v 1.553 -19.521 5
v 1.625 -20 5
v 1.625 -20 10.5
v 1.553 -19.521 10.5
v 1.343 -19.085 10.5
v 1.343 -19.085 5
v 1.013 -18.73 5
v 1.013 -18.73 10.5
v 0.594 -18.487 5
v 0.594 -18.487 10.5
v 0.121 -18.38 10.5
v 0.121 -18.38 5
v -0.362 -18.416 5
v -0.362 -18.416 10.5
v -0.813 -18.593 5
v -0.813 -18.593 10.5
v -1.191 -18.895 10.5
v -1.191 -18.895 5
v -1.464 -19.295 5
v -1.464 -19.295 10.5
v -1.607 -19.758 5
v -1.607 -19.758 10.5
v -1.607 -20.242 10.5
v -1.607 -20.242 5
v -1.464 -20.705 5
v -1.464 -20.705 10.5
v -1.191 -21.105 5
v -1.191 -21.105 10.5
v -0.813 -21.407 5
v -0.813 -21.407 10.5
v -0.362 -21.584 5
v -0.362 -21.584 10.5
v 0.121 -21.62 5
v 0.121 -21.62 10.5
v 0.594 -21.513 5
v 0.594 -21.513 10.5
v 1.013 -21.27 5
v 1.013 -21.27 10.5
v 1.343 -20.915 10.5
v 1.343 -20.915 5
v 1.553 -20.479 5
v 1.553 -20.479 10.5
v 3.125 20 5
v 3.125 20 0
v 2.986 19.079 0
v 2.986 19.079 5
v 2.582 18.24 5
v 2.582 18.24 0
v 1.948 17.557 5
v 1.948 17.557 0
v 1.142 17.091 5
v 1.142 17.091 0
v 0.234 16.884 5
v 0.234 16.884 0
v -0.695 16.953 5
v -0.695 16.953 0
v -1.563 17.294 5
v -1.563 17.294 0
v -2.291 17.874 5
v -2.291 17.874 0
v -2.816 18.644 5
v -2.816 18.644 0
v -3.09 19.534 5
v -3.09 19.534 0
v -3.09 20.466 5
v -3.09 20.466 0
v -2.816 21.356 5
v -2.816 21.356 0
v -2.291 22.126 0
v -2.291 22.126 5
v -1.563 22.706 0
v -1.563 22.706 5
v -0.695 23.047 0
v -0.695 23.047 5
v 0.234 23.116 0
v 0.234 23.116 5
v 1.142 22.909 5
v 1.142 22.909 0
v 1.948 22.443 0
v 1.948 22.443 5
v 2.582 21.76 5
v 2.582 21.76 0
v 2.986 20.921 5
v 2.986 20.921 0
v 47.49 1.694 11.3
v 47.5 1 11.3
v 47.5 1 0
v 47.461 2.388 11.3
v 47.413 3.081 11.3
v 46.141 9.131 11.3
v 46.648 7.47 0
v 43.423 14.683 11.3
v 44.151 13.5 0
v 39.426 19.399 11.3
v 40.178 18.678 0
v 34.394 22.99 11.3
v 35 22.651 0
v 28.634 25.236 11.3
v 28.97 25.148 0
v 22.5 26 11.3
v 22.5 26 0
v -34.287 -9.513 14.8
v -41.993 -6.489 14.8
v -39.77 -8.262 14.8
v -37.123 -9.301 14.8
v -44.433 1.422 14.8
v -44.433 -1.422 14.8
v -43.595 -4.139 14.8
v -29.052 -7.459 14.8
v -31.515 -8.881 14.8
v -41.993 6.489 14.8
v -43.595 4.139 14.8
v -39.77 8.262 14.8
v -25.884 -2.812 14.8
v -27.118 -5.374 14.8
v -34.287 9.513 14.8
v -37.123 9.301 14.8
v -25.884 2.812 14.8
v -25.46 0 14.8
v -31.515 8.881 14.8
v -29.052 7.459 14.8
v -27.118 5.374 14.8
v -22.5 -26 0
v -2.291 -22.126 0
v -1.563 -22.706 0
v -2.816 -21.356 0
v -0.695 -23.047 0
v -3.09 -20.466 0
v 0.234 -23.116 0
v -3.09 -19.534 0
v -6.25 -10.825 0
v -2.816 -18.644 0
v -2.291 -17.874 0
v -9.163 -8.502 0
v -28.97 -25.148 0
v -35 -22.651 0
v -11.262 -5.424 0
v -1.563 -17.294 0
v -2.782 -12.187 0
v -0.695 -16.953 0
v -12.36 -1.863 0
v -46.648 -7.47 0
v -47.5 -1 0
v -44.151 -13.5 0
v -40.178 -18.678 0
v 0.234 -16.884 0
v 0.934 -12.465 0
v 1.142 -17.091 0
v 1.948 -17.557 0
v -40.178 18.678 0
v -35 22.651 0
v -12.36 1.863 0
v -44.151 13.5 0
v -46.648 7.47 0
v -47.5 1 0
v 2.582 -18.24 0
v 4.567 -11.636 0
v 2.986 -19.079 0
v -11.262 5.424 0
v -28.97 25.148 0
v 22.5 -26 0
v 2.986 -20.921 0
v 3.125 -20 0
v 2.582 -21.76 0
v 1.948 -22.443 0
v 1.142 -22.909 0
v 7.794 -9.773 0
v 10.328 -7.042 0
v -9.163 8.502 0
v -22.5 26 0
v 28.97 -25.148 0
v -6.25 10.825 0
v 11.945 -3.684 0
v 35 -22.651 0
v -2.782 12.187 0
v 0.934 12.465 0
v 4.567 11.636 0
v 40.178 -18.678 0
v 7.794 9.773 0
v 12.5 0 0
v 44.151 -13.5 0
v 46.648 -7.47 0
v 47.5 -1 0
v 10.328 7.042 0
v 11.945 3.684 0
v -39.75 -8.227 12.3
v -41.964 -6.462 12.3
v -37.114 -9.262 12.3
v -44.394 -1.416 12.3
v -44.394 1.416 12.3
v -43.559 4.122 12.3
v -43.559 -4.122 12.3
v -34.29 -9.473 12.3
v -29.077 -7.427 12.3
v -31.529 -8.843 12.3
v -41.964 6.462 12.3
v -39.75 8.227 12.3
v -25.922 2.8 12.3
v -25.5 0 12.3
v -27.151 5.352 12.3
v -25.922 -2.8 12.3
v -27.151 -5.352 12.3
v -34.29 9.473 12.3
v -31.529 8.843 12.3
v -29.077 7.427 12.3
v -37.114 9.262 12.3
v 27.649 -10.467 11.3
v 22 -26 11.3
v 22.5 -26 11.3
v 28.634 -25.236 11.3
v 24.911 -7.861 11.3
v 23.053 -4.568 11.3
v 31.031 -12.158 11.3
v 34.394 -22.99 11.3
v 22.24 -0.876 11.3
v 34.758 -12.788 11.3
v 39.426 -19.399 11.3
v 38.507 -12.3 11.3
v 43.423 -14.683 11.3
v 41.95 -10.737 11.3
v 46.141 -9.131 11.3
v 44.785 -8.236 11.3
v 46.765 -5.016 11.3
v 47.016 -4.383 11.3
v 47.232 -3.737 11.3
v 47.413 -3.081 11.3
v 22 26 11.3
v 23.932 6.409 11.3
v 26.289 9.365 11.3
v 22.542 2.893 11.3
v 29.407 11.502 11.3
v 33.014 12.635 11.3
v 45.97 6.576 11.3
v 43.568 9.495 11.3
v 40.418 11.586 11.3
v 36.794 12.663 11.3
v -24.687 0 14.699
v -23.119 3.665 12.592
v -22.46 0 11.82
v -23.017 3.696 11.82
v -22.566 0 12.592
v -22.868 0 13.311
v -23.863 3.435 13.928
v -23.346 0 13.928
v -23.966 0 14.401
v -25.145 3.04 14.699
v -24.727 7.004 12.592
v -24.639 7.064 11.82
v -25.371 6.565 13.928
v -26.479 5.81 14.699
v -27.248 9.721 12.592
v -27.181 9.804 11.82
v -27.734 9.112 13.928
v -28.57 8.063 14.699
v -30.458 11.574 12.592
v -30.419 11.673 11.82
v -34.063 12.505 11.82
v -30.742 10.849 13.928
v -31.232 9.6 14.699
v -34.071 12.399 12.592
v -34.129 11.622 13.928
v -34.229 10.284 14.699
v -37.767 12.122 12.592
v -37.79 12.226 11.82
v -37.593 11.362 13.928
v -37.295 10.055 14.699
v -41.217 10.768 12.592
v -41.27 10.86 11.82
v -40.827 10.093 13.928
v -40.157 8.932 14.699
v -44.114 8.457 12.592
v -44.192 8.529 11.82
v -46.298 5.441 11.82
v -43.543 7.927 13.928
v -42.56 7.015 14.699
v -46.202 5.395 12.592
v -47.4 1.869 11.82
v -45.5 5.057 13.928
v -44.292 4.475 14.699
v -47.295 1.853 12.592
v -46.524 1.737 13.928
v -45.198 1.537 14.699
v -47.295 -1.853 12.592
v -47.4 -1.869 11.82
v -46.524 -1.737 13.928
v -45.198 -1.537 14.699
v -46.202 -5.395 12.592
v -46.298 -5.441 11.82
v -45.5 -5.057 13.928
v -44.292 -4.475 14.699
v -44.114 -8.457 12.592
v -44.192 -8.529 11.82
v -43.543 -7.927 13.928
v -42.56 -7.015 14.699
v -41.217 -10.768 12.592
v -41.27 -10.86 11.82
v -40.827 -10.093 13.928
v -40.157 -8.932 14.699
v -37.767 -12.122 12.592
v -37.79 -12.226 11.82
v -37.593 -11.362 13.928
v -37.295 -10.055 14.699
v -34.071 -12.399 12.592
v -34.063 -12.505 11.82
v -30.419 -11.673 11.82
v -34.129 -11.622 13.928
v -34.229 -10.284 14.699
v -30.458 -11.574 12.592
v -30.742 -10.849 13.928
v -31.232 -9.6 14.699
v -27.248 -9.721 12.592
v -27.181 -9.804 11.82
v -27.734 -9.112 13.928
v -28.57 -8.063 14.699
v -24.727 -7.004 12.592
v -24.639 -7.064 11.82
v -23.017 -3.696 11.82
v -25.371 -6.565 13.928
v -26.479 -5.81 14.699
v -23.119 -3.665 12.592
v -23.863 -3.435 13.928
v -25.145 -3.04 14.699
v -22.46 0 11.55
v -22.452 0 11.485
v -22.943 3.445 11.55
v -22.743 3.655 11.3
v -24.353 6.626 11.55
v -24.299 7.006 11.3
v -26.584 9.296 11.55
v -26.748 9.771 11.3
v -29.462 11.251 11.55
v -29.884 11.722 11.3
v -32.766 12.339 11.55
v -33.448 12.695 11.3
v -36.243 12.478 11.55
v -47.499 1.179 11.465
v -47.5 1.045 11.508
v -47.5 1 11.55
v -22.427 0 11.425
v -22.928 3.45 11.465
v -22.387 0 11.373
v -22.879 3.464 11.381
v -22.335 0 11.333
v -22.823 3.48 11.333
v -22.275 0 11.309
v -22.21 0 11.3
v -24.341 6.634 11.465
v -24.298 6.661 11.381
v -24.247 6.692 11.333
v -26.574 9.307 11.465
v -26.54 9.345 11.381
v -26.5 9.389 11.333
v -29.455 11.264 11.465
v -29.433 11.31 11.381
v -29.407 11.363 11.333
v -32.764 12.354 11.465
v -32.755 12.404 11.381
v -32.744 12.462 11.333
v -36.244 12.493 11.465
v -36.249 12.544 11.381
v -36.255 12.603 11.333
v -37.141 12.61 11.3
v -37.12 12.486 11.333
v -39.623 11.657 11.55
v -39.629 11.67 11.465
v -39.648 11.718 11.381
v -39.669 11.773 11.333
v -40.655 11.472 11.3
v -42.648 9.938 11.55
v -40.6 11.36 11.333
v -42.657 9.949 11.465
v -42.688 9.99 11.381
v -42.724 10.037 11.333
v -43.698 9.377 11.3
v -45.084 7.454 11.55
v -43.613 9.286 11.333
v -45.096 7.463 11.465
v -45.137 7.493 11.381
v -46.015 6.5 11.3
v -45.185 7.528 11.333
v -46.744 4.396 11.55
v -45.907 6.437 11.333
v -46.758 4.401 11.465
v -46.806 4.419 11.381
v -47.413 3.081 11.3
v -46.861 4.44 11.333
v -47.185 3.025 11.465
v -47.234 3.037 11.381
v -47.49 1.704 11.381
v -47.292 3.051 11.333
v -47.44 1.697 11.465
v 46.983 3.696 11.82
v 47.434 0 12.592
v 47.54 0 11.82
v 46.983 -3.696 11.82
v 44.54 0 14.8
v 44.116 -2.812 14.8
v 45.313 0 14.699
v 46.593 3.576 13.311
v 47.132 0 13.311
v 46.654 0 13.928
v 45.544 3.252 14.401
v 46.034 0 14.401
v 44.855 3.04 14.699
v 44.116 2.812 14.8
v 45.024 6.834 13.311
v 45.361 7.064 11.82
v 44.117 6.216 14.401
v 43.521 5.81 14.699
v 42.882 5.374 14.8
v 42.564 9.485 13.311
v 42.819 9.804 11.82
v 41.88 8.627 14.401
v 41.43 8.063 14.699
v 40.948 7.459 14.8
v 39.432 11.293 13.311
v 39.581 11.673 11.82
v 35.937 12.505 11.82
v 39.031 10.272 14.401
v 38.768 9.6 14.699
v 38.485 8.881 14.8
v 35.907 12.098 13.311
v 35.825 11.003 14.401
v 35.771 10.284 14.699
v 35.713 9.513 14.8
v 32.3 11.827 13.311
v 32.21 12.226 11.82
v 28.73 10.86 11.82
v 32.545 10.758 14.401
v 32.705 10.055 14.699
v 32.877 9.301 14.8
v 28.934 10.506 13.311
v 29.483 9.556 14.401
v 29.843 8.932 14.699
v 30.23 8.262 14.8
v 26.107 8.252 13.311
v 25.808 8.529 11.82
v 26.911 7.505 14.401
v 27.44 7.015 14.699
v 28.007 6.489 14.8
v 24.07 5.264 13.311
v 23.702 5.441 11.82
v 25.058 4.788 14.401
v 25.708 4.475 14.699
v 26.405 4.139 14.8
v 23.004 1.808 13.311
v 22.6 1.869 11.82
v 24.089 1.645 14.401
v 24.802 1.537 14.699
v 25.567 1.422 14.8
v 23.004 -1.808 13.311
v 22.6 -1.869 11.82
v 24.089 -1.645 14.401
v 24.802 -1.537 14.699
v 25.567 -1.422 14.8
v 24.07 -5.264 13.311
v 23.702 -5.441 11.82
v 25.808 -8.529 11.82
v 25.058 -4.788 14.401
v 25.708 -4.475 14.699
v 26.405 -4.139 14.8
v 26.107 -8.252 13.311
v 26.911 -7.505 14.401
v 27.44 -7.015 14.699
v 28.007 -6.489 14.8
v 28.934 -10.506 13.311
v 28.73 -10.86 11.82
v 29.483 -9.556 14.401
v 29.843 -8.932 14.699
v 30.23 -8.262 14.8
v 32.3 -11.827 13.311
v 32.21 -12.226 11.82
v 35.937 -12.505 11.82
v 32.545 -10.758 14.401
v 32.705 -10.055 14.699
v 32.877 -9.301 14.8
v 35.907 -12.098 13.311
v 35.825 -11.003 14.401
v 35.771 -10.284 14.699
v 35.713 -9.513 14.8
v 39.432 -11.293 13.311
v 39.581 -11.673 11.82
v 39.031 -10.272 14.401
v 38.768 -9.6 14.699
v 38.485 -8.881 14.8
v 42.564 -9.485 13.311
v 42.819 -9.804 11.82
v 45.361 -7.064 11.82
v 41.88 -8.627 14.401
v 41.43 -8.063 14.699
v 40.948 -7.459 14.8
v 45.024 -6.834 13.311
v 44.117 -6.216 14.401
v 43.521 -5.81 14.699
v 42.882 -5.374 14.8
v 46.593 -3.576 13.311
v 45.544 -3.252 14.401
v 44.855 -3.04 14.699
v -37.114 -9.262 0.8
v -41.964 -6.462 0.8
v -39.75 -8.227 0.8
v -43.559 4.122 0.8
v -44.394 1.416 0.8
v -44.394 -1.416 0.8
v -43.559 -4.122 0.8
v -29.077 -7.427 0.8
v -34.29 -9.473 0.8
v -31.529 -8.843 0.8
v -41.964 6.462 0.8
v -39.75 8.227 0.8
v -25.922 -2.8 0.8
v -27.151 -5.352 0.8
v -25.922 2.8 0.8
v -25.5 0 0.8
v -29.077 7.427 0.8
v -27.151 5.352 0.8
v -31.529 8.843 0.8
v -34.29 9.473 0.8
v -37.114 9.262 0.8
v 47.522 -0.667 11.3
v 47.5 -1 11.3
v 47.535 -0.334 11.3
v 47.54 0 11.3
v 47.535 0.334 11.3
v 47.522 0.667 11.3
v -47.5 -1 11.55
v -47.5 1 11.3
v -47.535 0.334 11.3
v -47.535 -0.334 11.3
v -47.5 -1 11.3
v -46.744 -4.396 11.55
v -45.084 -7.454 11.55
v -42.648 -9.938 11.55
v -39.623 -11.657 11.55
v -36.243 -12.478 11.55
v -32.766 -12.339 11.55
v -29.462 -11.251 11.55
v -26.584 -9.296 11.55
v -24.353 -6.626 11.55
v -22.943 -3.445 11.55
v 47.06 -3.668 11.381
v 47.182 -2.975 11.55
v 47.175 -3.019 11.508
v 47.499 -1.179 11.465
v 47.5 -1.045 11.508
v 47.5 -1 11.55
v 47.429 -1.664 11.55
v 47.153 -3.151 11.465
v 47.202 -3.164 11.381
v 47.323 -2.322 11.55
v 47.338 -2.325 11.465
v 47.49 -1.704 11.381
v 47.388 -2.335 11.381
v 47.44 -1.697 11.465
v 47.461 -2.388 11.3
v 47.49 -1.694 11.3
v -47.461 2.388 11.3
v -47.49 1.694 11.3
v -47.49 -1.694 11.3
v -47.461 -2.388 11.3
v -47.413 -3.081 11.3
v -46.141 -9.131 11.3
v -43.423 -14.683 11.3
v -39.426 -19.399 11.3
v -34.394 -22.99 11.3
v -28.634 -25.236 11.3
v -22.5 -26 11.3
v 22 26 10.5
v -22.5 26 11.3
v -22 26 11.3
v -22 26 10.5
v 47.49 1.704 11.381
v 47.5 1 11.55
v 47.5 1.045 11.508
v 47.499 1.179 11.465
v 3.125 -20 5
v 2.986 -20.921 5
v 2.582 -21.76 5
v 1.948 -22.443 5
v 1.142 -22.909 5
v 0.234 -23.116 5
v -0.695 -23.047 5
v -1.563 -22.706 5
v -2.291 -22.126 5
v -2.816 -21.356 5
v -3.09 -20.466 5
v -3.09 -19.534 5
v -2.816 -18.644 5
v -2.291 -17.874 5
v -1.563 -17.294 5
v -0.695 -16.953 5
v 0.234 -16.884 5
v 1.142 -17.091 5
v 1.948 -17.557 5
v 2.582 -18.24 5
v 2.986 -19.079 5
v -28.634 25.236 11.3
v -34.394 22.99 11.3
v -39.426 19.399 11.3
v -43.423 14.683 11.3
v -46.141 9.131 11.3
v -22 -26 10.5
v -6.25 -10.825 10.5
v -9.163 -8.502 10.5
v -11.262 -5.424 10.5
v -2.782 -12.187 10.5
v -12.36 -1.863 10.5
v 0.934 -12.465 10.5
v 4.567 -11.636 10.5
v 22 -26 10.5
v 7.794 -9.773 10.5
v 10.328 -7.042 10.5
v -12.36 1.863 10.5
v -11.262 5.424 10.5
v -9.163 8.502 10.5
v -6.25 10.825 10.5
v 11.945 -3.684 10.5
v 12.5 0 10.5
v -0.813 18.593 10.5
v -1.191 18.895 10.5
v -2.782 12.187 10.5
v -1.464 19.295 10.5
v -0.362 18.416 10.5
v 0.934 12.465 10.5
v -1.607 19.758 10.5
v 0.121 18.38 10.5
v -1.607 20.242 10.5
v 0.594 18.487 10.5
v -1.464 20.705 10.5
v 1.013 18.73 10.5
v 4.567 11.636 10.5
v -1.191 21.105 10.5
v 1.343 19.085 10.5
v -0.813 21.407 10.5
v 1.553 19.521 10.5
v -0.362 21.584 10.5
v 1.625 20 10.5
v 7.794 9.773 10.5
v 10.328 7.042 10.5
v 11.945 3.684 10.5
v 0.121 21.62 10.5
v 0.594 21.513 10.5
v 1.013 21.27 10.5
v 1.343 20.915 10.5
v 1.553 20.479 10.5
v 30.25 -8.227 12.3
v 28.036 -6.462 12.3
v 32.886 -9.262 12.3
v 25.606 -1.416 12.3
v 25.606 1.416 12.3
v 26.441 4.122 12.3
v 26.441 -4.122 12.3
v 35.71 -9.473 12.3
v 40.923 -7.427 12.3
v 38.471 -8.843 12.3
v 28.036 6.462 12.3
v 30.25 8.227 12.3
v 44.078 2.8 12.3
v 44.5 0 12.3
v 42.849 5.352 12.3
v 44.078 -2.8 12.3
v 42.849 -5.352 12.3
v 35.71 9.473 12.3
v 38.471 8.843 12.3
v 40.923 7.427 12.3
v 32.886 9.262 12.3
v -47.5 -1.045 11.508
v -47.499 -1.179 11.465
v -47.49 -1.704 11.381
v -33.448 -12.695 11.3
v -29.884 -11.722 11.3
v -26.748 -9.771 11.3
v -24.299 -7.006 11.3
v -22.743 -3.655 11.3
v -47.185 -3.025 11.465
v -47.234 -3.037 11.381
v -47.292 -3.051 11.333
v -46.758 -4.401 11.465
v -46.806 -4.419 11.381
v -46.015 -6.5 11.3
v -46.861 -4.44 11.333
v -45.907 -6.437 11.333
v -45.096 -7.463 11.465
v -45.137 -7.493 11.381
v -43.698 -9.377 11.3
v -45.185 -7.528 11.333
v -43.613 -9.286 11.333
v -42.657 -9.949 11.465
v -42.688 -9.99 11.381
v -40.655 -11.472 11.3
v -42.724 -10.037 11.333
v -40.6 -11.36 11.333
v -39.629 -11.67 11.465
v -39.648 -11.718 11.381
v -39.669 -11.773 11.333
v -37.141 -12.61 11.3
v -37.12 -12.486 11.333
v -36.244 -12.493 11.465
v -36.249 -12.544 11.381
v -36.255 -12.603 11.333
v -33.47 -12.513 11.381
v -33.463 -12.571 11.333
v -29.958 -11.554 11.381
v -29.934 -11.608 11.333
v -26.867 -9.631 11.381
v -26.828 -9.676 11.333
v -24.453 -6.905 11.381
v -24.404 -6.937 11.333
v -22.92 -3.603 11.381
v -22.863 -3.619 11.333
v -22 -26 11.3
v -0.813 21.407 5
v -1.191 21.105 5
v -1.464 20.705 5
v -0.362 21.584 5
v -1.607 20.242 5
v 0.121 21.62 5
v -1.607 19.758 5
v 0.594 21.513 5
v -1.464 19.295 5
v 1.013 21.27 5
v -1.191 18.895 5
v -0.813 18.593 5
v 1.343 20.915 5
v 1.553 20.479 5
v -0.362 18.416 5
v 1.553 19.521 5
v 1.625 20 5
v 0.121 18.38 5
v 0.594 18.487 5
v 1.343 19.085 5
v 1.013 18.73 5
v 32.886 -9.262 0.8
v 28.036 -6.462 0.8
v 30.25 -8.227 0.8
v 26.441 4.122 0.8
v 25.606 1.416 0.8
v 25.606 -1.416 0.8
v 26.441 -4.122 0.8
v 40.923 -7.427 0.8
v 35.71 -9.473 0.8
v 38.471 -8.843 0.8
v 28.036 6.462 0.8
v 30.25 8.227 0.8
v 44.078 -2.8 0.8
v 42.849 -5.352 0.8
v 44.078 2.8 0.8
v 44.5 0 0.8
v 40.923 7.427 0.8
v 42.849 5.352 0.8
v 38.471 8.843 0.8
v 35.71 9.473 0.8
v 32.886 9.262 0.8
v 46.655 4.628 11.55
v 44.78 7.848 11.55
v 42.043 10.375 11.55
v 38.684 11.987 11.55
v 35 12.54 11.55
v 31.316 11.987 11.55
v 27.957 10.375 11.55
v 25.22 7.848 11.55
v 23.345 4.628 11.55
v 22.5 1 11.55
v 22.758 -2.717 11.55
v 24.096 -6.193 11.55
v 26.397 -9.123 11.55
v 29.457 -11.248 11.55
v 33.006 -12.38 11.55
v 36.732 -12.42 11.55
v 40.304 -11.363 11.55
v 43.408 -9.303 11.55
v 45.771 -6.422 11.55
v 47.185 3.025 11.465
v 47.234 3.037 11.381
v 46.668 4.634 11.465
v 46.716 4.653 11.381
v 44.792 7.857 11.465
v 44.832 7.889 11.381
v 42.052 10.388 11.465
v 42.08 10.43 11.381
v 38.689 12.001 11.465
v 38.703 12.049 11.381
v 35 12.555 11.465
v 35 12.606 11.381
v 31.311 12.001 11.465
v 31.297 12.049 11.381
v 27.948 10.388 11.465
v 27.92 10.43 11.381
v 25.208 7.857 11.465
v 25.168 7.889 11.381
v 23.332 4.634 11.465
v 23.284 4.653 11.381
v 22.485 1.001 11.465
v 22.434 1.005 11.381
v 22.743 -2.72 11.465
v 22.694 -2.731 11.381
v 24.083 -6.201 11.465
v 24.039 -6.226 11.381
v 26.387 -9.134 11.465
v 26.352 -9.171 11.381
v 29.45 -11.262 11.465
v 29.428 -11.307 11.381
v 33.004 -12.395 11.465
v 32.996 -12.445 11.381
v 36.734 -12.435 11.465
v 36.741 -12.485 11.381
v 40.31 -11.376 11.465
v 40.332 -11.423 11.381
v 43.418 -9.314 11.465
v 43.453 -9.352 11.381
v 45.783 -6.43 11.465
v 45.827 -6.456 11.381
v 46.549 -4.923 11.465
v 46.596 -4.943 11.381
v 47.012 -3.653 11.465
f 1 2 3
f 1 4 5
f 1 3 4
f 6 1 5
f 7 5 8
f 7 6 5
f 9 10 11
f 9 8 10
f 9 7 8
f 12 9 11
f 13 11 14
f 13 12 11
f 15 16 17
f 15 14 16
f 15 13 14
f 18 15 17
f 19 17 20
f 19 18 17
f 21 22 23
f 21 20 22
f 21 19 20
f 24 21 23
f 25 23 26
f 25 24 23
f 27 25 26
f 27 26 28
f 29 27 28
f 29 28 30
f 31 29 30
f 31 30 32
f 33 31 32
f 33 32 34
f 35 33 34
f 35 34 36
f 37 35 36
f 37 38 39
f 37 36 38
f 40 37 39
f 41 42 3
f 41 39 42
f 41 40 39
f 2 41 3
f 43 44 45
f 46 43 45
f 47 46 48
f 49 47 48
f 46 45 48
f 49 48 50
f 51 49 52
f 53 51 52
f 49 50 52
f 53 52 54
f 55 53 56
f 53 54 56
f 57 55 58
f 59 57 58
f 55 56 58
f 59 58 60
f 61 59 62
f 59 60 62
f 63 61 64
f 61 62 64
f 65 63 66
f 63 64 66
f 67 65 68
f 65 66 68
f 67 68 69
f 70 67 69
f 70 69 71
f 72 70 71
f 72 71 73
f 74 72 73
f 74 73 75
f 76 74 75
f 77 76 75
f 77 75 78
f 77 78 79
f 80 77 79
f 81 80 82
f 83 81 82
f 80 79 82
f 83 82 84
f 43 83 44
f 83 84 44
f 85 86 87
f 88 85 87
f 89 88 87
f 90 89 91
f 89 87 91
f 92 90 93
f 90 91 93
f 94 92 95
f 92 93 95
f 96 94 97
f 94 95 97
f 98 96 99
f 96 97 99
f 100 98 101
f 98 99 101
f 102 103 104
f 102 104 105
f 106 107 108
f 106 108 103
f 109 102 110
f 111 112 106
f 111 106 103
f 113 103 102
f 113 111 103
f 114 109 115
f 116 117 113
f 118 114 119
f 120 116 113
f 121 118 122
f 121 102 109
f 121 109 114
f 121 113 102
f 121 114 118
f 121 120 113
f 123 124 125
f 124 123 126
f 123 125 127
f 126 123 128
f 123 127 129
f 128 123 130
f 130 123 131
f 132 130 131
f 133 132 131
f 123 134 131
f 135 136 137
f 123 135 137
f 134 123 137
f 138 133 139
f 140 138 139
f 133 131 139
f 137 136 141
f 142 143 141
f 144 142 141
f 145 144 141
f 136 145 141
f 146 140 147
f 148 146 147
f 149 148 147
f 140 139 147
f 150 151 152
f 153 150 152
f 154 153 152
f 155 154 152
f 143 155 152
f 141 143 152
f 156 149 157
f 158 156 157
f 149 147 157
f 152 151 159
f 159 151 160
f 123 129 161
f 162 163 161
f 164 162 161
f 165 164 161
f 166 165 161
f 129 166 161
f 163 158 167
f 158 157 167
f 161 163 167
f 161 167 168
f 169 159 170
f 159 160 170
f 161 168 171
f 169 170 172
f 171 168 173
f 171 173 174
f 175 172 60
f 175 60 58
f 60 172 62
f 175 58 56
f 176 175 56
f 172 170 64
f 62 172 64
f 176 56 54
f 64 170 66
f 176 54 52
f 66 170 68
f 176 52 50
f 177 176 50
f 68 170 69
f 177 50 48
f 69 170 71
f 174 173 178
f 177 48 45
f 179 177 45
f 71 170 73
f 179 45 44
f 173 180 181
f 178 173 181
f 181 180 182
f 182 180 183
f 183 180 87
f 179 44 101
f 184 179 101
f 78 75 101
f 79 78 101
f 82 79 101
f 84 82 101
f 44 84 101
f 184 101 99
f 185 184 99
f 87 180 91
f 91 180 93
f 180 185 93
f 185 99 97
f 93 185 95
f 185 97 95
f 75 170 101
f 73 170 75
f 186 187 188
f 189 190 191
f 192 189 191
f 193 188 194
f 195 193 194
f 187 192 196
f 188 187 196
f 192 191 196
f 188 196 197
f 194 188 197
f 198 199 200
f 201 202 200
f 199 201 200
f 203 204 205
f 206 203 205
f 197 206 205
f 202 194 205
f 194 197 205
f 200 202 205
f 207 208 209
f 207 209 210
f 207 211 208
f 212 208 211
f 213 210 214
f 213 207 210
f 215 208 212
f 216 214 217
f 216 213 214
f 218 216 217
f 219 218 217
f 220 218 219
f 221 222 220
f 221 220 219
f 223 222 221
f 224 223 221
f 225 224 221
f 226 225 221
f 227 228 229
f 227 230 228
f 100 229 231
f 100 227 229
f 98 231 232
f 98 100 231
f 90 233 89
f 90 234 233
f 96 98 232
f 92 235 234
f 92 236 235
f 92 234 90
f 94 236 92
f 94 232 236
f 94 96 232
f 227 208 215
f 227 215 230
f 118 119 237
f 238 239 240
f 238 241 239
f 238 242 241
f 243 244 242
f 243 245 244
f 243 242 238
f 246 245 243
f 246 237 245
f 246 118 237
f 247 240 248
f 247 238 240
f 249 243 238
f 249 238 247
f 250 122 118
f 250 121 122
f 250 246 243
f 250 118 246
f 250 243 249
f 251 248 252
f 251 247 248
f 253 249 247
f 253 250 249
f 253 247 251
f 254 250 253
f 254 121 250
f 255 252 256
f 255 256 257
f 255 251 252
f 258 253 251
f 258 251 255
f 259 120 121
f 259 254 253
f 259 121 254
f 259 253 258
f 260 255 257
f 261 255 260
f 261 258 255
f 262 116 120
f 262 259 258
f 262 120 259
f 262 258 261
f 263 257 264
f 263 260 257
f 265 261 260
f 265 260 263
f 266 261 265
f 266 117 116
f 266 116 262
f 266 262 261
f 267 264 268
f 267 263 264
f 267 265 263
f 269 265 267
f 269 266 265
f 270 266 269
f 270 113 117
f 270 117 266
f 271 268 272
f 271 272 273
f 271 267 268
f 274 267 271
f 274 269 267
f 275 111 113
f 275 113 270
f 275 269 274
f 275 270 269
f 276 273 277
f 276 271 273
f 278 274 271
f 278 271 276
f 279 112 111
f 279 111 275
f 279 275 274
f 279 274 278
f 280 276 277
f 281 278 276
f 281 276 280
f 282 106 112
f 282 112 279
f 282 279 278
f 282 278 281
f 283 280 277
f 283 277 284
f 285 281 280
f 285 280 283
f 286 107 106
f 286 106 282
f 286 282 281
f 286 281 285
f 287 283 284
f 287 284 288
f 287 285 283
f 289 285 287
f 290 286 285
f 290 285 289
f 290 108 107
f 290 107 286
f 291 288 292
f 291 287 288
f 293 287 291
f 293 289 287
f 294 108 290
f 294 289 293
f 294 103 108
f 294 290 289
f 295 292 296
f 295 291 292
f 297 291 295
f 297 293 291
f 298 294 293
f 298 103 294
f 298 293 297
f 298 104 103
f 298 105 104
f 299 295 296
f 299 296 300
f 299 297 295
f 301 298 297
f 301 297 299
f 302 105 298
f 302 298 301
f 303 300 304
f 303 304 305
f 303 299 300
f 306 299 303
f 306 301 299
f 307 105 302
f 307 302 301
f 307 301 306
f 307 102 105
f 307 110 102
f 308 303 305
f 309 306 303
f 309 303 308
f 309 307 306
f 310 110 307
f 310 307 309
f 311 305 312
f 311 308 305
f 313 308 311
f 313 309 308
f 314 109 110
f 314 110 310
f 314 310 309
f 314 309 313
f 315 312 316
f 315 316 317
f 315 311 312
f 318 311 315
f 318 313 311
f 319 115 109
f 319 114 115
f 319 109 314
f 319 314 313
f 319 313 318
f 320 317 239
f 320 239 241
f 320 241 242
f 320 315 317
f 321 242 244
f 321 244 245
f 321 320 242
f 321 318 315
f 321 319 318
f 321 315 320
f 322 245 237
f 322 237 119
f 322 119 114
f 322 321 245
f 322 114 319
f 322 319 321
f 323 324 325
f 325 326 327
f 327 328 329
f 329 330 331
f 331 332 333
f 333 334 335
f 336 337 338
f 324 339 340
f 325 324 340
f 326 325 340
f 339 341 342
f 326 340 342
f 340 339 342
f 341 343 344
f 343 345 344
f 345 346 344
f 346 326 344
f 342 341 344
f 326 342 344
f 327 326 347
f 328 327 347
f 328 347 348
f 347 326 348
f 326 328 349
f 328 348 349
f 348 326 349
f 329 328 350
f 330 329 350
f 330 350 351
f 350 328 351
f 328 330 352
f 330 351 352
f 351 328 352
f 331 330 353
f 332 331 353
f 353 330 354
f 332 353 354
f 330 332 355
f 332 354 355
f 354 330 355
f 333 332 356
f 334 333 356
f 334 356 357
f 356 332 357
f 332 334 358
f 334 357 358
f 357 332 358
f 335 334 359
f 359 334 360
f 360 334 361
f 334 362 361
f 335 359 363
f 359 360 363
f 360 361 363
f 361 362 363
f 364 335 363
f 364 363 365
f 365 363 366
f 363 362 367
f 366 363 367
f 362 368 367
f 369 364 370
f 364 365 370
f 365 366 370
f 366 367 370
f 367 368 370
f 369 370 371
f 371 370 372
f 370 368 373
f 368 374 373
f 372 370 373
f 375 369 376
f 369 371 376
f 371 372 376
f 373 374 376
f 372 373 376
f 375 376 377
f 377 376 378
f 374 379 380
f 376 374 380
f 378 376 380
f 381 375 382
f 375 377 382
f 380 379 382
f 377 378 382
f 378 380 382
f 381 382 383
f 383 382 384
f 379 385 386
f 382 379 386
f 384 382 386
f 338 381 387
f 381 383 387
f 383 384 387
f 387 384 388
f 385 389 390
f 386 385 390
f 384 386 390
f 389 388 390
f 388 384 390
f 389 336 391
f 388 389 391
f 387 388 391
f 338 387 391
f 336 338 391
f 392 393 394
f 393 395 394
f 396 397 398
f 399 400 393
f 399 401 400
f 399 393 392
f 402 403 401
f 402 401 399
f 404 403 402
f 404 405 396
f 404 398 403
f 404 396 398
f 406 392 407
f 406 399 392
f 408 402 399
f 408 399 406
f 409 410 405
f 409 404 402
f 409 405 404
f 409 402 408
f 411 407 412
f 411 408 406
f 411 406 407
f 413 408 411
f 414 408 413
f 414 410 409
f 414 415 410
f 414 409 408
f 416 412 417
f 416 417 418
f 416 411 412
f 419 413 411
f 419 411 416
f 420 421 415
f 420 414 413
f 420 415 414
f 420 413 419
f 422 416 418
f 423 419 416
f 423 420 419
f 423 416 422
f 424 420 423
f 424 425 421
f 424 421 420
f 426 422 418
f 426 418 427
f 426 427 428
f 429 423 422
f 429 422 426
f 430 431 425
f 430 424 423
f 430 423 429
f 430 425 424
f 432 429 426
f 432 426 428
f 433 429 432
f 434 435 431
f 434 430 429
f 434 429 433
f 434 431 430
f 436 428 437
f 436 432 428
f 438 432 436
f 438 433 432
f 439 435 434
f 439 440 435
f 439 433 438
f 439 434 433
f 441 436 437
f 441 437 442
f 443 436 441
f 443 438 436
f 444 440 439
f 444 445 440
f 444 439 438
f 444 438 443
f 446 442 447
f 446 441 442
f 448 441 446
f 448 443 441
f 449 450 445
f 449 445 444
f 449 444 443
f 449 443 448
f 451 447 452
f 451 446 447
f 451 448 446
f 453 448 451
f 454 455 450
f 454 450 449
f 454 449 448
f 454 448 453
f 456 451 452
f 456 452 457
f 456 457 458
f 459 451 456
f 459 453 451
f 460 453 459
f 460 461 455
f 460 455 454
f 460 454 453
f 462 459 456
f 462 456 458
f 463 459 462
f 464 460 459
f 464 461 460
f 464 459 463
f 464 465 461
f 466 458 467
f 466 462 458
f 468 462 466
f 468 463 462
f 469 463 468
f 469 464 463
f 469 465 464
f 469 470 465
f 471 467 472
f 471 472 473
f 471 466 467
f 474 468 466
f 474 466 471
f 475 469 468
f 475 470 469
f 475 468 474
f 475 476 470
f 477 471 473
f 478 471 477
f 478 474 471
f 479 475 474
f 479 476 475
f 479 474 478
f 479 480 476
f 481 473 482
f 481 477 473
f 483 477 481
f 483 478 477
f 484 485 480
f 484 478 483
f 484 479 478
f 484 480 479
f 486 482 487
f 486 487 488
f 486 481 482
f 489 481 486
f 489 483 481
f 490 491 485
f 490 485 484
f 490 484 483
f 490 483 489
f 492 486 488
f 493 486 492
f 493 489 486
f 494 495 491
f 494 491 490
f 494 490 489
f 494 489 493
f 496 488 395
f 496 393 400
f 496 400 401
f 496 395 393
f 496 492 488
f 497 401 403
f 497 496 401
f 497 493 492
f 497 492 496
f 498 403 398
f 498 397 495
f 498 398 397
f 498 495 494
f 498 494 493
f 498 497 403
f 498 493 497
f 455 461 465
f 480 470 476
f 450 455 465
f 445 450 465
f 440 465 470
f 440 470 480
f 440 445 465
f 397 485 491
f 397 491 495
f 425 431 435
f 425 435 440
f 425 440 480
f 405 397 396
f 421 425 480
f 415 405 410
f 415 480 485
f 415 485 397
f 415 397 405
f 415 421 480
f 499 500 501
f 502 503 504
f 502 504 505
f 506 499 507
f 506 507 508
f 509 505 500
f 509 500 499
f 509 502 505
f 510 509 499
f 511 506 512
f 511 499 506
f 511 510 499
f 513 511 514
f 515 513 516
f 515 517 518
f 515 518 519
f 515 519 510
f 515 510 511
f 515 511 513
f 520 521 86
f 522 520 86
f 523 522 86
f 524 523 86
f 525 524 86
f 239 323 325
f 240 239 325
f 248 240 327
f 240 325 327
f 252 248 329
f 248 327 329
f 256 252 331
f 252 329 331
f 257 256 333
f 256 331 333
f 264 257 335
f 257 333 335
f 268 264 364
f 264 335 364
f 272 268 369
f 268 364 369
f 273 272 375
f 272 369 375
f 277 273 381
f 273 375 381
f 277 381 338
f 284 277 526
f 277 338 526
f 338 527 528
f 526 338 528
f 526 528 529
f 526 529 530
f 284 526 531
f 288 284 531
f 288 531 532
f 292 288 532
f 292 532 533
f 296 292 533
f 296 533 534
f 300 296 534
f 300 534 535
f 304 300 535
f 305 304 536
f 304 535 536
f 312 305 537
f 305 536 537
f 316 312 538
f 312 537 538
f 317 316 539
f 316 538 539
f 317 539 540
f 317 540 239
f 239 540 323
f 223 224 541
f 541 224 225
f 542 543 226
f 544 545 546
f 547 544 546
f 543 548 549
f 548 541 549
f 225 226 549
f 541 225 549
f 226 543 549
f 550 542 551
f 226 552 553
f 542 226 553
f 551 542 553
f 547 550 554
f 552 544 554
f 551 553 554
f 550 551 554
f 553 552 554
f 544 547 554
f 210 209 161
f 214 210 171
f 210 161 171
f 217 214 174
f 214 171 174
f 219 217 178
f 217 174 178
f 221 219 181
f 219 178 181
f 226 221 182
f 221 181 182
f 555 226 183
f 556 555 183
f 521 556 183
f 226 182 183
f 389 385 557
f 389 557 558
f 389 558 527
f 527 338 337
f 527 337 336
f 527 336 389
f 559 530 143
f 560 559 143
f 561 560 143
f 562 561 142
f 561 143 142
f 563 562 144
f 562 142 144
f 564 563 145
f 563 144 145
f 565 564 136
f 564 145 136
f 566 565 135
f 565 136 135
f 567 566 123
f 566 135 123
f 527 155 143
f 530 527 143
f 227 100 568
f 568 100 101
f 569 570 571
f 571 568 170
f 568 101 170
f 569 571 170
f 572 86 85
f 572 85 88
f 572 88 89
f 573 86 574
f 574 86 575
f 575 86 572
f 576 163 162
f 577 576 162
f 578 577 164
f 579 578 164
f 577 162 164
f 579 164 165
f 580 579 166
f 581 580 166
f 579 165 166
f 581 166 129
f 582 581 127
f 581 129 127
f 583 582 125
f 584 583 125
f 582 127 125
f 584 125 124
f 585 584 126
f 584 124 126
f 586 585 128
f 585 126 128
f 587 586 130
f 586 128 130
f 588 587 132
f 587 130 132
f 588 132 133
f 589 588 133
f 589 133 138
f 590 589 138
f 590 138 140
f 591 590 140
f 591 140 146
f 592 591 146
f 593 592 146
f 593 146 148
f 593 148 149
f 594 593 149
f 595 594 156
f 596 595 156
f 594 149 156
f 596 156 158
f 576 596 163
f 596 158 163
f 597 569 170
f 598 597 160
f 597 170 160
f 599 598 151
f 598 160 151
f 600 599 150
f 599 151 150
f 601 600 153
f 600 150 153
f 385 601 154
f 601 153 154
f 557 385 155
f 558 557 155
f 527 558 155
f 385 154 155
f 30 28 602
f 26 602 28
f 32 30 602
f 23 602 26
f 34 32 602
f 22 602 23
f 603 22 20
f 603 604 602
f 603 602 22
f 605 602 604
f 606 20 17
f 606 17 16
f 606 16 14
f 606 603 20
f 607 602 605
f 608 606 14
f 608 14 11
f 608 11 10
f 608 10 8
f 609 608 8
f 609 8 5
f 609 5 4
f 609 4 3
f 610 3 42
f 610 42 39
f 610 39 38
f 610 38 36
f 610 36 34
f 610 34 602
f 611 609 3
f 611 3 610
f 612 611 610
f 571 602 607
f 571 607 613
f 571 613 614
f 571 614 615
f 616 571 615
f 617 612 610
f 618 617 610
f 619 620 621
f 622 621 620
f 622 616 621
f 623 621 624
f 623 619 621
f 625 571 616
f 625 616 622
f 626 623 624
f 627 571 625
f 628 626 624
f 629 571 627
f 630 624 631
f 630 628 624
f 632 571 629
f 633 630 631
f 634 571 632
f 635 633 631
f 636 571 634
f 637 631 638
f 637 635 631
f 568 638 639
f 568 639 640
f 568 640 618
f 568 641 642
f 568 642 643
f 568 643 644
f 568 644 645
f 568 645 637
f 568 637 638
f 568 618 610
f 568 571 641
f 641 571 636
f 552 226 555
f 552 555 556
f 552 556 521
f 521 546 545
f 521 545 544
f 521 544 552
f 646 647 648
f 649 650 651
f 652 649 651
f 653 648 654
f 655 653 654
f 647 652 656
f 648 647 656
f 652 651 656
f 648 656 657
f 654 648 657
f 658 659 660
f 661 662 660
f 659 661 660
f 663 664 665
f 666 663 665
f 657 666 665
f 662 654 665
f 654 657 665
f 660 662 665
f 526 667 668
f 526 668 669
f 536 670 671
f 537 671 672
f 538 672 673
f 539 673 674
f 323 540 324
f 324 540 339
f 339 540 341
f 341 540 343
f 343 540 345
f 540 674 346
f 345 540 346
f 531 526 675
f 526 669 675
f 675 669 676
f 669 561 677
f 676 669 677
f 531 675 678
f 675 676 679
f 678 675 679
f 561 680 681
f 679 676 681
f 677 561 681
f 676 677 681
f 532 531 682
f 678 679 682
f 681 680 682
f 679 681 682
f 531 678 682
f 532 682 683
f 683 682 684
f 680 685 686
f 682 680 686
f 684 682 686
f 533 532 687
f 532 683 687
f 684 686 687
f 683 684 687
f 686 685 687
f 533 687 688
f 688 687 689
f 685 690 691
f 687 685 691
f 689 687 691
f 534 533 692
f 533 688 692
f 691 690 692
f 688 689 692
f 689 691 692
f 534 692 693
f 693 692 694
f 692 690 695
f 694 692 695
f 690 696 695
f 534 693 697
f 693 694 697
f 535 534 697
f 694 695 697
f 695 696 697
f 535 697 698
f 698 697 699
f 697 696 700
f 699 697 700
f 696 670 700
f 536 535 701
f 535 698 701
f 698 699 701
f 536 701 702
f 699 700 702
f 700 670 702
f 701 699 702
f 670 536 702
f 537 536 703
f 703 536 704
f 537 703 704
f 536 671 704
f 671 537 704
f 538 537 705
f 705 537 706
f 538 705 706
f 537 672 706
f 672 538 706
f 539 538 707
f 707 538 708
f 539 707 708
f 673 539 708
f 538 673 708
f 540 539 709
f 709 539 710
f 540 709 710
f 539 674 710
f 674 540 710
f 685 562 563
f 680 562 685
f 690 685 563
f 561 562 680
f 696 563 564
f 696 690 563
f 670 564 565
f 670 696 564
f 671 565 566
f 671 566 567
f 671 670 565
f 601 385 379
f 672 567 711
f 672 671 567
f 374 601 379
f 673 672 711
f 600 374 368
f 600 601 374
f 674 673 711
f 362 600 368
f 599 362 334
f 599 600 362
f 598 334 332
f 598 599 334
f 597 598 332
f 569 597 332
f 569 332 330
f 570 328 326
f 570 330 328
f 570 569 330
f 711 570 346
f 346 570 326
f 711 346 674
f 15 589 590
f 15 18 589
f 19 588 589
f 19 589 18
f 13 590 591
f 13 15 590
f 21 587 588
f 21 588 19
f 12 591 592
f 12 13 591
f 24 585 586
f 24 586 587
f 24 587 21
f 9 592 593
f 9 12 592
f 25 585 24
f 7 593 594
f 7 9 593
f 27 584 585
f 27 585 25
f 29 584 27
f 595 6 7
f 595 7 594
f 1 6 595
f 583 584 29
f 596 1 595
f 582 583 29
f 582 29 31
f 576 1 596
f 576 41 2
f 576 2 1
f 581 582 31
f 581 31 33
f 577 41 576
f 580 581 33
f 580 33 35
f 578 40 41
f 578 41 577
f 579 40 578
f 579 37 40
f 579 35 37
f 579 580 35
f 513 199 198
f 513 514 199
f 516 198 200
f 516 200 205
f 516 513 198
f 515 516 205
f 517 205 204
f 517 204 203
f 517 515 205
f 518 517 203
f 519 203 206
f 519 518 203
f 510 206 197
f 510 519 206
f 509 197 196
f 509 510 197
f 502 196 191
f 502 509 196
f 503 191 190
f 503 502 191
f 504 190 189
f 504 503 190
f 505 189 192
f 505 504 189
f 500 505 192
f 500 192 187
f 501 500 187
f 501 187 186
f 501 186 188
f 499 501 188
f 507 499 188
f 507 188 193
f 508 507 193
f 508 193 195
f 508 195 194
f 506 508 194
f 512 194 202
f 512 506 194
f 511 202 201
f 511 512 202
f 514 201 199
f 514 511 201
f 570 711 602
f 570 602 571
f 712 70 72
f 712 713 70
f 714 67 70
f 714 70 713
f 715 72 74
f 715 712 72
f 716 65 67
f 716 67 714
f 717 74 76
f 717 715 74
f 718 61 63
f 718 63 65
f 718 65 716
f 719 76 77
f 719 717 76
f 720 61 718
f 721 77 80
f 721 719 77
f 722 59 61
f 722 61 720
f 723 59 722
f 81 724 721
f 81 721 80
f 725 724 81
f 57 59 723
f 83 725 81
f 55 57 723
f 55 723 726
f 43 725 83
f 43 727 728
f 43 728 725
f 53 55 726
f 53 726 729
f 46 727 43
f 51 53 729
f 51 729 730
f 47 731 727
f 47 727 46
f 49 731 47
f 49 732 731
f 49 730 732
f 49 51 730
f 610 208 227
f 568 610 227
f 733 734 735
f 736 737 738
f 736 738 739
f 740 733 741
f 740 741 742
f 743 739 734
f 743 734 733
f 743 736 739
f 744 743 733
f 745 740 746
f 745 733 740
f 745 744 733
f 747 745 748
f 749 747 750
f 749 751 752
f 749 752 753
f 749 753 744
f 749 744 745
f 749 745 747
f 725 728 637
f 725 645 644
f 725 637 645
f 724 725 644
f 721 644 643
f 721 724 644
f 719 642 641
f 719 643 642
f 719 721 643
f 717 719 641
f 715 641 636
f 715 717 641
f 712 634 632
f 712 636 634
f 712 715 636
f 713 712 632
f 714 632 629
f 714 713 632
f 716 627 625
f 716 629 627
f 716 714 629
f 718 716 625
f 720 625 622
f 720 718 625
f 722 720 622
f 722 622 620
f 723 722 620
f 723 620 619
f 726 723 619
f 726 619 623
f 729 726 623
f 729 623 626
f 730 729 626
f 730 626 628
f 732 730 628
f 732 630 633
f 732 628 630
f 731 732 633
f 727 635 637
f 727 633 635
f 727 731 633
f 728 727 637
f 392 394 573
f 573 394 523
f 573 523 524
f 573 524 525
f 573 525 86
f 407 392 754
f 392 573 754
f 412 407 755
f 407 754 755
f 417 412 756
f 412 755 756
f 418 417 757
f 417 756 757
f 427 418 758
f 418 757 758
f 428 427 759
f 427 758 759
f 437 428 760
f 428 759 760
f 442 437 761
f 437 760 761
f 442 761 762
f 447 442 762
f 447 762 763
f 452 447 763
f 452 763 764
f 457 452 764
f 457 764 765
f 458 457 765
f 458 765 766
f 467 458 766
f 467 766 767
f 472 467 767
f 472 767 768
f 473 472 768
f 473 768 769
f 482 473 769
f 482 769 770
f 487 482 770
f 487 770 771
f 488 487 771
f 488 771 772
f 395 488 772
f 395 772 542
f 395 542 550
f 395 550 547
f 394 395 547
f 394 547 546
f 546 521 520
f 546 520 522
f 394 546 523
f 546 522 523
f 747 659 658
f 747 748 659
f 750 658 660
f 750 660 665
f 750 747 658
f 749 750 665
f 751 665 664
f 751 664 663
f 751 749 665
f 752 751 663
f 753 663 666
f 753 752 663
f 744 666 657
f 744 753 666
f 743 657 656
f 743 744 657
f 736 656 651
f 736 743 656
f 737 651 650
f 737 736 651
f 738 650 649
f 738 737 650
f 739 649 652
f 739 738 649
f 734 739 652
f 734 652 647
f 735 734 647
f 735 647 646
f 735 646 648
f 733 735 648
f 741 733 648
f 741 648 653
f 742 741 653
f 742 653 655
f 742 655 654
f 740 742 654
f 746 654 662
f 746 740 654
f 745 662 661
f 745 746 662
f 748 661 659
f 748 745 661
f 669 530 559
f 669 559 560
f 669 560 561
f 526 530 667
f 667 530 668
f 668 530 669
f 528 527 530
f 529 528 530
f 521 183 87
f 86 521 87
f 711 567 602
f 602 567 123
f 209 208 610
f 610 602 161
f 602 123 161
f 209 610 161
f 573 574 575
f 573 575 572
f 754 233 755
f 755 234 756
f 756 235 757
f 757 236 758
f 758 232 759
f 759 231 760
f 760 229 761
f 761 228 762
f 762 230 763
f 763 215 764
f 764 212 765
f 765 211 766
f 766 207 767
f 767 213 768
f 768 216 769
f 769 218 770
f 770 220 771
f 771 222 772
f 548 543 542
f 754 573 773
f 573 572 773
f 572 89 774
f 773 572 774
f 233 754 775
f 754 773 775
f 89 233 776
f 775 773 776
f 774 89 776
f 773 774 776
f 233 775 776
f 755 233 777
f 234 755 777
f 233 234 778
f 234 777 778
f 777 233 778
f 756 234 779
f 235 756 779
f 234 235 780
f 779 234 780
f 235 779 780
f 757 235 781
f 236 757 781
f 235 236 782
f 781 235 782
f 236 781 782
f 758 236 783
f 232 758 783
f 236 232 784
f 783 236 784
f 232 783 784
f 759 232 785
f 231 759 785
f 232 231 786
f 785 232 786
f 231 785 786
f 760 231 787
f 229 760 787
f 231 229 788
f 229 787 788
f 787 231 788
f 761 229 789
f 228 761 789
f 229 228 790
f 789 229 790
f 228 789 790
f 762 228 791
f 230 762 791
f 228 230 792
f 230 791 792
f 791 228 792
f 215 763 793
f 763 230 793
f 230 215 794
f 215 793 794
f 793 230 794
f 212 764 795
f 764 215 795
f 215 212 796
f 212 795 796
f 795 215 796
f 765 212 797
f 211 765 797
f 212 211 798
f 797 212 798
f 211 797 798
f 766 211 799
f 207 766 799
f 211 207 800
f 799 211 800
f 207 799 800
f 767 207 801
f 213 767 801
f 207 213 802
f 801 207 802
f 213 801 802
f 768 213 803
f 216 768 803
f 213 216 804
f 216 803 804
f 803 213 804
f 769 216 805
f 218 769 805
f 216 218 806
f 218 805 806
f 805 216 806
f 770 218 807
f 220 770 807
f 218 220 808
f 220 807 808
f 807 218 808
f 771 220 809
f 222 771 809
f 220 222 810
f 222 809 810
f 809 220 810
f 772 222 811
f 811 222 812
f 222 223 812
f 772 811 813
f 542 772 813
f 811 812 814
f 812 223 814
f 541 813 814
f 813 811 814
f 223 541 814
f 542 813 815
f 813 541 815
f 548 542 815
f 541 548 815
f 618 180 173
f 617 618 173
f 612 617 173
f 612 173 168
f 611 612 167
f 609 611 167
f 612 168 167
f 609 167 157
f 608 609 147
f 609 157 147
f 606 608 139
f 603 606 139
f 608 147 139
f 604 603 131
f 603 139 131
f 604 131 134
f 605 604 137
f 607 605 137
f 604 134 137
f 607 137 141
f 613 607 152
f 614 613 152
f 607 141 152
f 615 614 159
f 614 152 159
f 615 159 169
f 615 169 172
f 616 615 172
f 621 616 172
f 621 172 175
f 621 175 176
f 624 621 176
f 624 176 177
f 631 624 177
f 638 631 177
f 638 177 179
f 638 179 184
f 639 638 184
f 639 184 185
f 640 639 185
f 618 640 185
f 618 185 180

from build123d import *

# Parameters (mm, degrees)
F0_R          = 1.625
F1_DEPTH      = 11.3
F2_R          = 12.5
F3_DEPTH      = 11.301
F4_R          = 9.5
F5_DEPTH      = 10.5
F6_R          = 3.125
F7_DEPTH      = 5
F8_W          = 44
F8_H          = 52
F9_DEPTH      = 0.8
F10_R         = 12.539936204
F10_R_2       = 9.5
F11_DEPTH     = 1
F12_R         = 12.54
F13_DEPTH     = 2.5
F16_T4_ANGLE  = 178.2861059353
F16_S5_R      = 25
F16_T6_DEPTH  = 17
F16_T10_ANGLE = 178.2861059353
F16_S11_R     = 25
F16_T12_DEPTH = 17
F16_T16_ANGLE = 356.5984947452
F16_S17_R     = 25
F16_T18_DEPTH = 21
F16_T22_ANGLE = 356.5984947452
F16_S23_R     = 25
F16_T24_DEPTH = 21


# Not quite as in the source:
# - a fillet or chamfer that OpenCascade refuses, or shapes differently, is made with other operations: its cross-section is extruded or revolved along the edge and cut away or added
# - a feature of the source that left no trace in its solid (it failed there, or was rolled back) is left out


with BuildPart() as f1:
    # F0 (on Top) → F1 (new body)
    with BuildSketch(Plane.XY):
        with BuildLine():
            Line((-22.5, -26), (22.5, -26))
            ThreePointArc((22.5, -26), (40.1776695297, -18.6776695297), (47.5, -1))
            Line((47.5, -1), (47.5, 1))
            ThreePointArc((47.5, 1), (40.1776695297, 18.6776695297), (22.5, 26))
            Line((22.5, 26), (-22.5, 26))
            ThreePointArc((-22.5, 26), (-40.1776695297, 18.6776695297), (-47.5, 1))
            Line((-47.5, 1), (-47.5, -1))
            ThreePointArc((-47.5, -1), (-40.1776695297, -18.6776695297), (-22.5, -26))
        make_face()
        with Locations((0, -20)):
            Circle(F0_R, mode=Mode.SUBTRACT)
        with Locations((0, 20)):
            Circle(F0_R, mode=Mode.SUBTRACT)
    extrude(amount=F1_DEPTH)

    # F2 (on face) → F3 (cut, through all)
    with BuildSketch(Plane(origin=(0, 0, 0), x_dir=(1, 0, 0), z_dir=(0, 0, -1))):
        Circle(F2_R)
    extrude(amount=-F3_DEPTH, mode=Mode.SUBTRACT)

    # F4 (on face) → F5 (cut)
    with BuildSketch(Plane.XY.offset(11.3)):
        with Locations((-35, 0)):
            Circle(F4_R)
        with Locations((35, 0)):
            Circle(F4_R)
    extrude(amount=-F5_DEPTH, mode=Mode.SUBTRACT)

    # F6 (on face) → F7 (cut)
    with BuildSketch(Plane(origin=(0, 0, 0), x_dir=(1, 0, 0), z_dir=(0, 0, -1))):
        with Locations((0, 20)):
            Circle(F6_R)
        with Locations((0, -20)):
            Circle(F6_R)
    extrude(amount=-F7_DEPTH, mode=Mode.SUBTRACT)

    # F8 (on face) → F9 (cut)
    with BuildSketch(Plane.XY.offset(11.3)):
        Rectangle(F8_W, F8_H)
    extrude(amount=-F9_DEPTH, mode=Mode.SUBTRACT)

    # F10 (on face) → F11 (join)
    with BuildSketch(Plane.XY.offset(11.3)):
        with Locations((-35, 0)):
            Circle(F10_R)
        with Locations((-35, 0)):
            Circle(F10_R_2, mode=Mode.SUBTRACT)
        with Locations((35, 0)):
            Circle(F10_R)
        with Locations((35, 0)):
            Circle(F10_R_2, mode=Mode.SUBTRACT)
    extrude(amount=F11_DEPTH)

    # F12 (on face) → F13 (join)
    with BuildSketch(Plane.XY.offset(12.3)):
        with Locations((-35, 0)):
            Circle(F12_R)
        with Locations((35, 0)):
            Circle(F12_R)
    extrude(amount=F13_DEPTH)

    # F14: fillet of radius 3 on 1 edges, made by hand

    # F14_s1 → F14_t2 (revolve, cut)
    with BuildSketch(Plane.XZ):
        with BuildLine():
            ThreePointArc((-22.46, 11.8), (-23.3386796564, 13.9213203436), (-25.46, 14.8))
            Line((-25.46, 14.8), (-22.46, 14.8))
            Line((-22.46, 14.8), (-22.46, 11.8))
        make_face()
    revolve(axis=Axis((-35, 0, 14.8), (0, 0, 1)), mode=Mode.SUBTRACT)

    # F15: fillet of radius 3 on 1 edges, made by hand

    # F15_s1 → F15_t2 (revolve, cut)
    with BuildSketch(Plane.XZ):
        with BuildLine():
            ThreePointArc((47.54, 11.8), (46.6613203436, 13.9213203436), (44.54, 14.8))
            Line((44.54, 14.8), (47.54, 14.8))
            Line((47.54, 14.8), (47.54, 11.8))
        make_face()
    revolve(axis=Axis((35, 0, 14.8), (0, 0, 1)), mode=Mode.SUBTRACT)

    # F16: fillet of radius 0.25 on 3 edges, made by hand


with BuildPart() as f16_tool2:
    # F16_s3 → F16_t4 (revolve)
    with BuildSketch(Plane.XZ):
        with BuildLine():
            ThreePointArc((-22.460063796, 11.55), (-22.3868404913, 11.3732233047), (-22.210063796, 11.3))
            Line((-22.210063796, 11.3), (-22.460063796, 11.3))
            Line((-22.460063796, 11.3), (-22.460063796, 11.55))
        make_face()
    revolve(axis=Axis((-35, 0, 11.3), (0, 0, 1)), revolution_arc=F16_T4_ANGLE)

    # F16_s5 → F16_t6 (intersect, symmetric)
    with BuildSketch(Plane.XY.offset(11.5)):
        with Locations((-22.5, 1)):
            Circle(F16_S5_R)
    extrude(amount=F16_T6_DEPTH, both=True, mode=Mode.INTERSECT)


with BuildPart() as f1_1:
    add(f1.part)

    # F16_t1: union F16_tool2
    add(f16_tool2.part)


with BuildPart() as f16_tool8:
    # F16_s9 → F16_t10 (revolve)
    with BuildSketch(Plane(origin=(-0.0313084228, 1.046333877, 0), x_dir=(0, 0, 1), z_dir=(-0.0299086337, 0.9995526367, 0))):
        with BuildLine():
            ThreePointArc((11.55, -47.5242784902), (11.3732233047, -47.5975017949), (11.3, -47.7742784902))
            Line((11.3, -47.7742784902), (11.3, -47.5242784902))
            Line((11.3, -47.5242784902), (11.55, -47.5242784902))
        make_face()
    revolve(axis=Axis((-35, 0, 11.3), (0, 0, 1)), revolution_arc=F16_T10_ANGLE)

    # F16_s11 → F16_t12 (intersect, symmetric)
    with BuildSketch(Plane.XY.offset(11.5)):
        with Locations((-22.5, -1)):
            Circle(F16_S11_R)
    extrude(amount=F16_T12_DEPTH, both=True, mode=Mode.INTERSECT)


with BuildPart() as f1_2:
    add(f1_1.part)

    # F16_t7: union F16_tool8
    add(f16_tool8.part)


with BuildPart() as f16_tool14:
    # F16_s15 → F16_t16 (revolve)
    with BuildSketch(Plane(origin=(0.0308302837, -1.0383204819, 0), x_dir=(0, 0, 1), z_dir=(0.0296793741, -0.9995594703, 0))):
        with BuildLine():
            ThreePointArc((11.55, -47.524517666), (11.3732233047, -47.5977409707), (11.3, -47.774517666))
            Line((11.3, -47.774517666), (11.3, -47.524517666))
            Line((11.3, -47.524517666), (11.55, -47.524517666))
        make_face()
    revolve(axis=Axis((35, 0, 11.3), (0, 0, 1)), revolution_arc=F16_T16_ANGLE)

    # F16_s17 → F16_t18 (intersect, symmetric)
    with BuildSketch(Plane.XY.offset(11.5)):
        with Locations((22.5, 1)):
            Circle(F16_S17_R)
    extrude(amount=F16_T18_DEPTH, both=True, mode=Mode.INTERSECT)


with BuildPart() as f1_3:
    add(f1_2.part)

    # F16_t13: union F16_tool14
    add(f16_tool14.part)


with BuildPart() as f16_tool20:
    # F16_s21 → F16_t22 (revolve)
    with BuildSketch(Plane(origin=(0.0308302837, -1.0383204819, 0), x_dir=(0, 0, 1), z_dir=(0.0296793741, -0.9995594703, 0))):
        with BuildLine():
            ThreePointArc((11.55, -47.524517666), (11.3732233047, -47.5977409707), (11.3, -47.774517666))
            Line((11.3, -47.774517666), (11.3, -47.524517666))
            Line((11.3, -47.524517666), (11.55, -47.524517666))
        make_face()
    revolve(axis=Axis((35, 0, 11.3), (0, 0, 1)), revolution_arc=F16_T22_ANGLE)

    # F16_s23 → F16_t24 (intersect, symmetric)
    with BuildSketch(Plane.XY.offset(11.5)):
        with Locations((22.5, -1)):
            Circle(F16_S23_R)
    extrude(amount=F16_T24_DEPTH, both=True, mode=Mode.INTERSECT)


with BuildPart() as f1_4:
    add(f1_3.part)

    # F16_t19: union F16_tool20
    add(f16_tool20.part)


solid = f1_4.part
